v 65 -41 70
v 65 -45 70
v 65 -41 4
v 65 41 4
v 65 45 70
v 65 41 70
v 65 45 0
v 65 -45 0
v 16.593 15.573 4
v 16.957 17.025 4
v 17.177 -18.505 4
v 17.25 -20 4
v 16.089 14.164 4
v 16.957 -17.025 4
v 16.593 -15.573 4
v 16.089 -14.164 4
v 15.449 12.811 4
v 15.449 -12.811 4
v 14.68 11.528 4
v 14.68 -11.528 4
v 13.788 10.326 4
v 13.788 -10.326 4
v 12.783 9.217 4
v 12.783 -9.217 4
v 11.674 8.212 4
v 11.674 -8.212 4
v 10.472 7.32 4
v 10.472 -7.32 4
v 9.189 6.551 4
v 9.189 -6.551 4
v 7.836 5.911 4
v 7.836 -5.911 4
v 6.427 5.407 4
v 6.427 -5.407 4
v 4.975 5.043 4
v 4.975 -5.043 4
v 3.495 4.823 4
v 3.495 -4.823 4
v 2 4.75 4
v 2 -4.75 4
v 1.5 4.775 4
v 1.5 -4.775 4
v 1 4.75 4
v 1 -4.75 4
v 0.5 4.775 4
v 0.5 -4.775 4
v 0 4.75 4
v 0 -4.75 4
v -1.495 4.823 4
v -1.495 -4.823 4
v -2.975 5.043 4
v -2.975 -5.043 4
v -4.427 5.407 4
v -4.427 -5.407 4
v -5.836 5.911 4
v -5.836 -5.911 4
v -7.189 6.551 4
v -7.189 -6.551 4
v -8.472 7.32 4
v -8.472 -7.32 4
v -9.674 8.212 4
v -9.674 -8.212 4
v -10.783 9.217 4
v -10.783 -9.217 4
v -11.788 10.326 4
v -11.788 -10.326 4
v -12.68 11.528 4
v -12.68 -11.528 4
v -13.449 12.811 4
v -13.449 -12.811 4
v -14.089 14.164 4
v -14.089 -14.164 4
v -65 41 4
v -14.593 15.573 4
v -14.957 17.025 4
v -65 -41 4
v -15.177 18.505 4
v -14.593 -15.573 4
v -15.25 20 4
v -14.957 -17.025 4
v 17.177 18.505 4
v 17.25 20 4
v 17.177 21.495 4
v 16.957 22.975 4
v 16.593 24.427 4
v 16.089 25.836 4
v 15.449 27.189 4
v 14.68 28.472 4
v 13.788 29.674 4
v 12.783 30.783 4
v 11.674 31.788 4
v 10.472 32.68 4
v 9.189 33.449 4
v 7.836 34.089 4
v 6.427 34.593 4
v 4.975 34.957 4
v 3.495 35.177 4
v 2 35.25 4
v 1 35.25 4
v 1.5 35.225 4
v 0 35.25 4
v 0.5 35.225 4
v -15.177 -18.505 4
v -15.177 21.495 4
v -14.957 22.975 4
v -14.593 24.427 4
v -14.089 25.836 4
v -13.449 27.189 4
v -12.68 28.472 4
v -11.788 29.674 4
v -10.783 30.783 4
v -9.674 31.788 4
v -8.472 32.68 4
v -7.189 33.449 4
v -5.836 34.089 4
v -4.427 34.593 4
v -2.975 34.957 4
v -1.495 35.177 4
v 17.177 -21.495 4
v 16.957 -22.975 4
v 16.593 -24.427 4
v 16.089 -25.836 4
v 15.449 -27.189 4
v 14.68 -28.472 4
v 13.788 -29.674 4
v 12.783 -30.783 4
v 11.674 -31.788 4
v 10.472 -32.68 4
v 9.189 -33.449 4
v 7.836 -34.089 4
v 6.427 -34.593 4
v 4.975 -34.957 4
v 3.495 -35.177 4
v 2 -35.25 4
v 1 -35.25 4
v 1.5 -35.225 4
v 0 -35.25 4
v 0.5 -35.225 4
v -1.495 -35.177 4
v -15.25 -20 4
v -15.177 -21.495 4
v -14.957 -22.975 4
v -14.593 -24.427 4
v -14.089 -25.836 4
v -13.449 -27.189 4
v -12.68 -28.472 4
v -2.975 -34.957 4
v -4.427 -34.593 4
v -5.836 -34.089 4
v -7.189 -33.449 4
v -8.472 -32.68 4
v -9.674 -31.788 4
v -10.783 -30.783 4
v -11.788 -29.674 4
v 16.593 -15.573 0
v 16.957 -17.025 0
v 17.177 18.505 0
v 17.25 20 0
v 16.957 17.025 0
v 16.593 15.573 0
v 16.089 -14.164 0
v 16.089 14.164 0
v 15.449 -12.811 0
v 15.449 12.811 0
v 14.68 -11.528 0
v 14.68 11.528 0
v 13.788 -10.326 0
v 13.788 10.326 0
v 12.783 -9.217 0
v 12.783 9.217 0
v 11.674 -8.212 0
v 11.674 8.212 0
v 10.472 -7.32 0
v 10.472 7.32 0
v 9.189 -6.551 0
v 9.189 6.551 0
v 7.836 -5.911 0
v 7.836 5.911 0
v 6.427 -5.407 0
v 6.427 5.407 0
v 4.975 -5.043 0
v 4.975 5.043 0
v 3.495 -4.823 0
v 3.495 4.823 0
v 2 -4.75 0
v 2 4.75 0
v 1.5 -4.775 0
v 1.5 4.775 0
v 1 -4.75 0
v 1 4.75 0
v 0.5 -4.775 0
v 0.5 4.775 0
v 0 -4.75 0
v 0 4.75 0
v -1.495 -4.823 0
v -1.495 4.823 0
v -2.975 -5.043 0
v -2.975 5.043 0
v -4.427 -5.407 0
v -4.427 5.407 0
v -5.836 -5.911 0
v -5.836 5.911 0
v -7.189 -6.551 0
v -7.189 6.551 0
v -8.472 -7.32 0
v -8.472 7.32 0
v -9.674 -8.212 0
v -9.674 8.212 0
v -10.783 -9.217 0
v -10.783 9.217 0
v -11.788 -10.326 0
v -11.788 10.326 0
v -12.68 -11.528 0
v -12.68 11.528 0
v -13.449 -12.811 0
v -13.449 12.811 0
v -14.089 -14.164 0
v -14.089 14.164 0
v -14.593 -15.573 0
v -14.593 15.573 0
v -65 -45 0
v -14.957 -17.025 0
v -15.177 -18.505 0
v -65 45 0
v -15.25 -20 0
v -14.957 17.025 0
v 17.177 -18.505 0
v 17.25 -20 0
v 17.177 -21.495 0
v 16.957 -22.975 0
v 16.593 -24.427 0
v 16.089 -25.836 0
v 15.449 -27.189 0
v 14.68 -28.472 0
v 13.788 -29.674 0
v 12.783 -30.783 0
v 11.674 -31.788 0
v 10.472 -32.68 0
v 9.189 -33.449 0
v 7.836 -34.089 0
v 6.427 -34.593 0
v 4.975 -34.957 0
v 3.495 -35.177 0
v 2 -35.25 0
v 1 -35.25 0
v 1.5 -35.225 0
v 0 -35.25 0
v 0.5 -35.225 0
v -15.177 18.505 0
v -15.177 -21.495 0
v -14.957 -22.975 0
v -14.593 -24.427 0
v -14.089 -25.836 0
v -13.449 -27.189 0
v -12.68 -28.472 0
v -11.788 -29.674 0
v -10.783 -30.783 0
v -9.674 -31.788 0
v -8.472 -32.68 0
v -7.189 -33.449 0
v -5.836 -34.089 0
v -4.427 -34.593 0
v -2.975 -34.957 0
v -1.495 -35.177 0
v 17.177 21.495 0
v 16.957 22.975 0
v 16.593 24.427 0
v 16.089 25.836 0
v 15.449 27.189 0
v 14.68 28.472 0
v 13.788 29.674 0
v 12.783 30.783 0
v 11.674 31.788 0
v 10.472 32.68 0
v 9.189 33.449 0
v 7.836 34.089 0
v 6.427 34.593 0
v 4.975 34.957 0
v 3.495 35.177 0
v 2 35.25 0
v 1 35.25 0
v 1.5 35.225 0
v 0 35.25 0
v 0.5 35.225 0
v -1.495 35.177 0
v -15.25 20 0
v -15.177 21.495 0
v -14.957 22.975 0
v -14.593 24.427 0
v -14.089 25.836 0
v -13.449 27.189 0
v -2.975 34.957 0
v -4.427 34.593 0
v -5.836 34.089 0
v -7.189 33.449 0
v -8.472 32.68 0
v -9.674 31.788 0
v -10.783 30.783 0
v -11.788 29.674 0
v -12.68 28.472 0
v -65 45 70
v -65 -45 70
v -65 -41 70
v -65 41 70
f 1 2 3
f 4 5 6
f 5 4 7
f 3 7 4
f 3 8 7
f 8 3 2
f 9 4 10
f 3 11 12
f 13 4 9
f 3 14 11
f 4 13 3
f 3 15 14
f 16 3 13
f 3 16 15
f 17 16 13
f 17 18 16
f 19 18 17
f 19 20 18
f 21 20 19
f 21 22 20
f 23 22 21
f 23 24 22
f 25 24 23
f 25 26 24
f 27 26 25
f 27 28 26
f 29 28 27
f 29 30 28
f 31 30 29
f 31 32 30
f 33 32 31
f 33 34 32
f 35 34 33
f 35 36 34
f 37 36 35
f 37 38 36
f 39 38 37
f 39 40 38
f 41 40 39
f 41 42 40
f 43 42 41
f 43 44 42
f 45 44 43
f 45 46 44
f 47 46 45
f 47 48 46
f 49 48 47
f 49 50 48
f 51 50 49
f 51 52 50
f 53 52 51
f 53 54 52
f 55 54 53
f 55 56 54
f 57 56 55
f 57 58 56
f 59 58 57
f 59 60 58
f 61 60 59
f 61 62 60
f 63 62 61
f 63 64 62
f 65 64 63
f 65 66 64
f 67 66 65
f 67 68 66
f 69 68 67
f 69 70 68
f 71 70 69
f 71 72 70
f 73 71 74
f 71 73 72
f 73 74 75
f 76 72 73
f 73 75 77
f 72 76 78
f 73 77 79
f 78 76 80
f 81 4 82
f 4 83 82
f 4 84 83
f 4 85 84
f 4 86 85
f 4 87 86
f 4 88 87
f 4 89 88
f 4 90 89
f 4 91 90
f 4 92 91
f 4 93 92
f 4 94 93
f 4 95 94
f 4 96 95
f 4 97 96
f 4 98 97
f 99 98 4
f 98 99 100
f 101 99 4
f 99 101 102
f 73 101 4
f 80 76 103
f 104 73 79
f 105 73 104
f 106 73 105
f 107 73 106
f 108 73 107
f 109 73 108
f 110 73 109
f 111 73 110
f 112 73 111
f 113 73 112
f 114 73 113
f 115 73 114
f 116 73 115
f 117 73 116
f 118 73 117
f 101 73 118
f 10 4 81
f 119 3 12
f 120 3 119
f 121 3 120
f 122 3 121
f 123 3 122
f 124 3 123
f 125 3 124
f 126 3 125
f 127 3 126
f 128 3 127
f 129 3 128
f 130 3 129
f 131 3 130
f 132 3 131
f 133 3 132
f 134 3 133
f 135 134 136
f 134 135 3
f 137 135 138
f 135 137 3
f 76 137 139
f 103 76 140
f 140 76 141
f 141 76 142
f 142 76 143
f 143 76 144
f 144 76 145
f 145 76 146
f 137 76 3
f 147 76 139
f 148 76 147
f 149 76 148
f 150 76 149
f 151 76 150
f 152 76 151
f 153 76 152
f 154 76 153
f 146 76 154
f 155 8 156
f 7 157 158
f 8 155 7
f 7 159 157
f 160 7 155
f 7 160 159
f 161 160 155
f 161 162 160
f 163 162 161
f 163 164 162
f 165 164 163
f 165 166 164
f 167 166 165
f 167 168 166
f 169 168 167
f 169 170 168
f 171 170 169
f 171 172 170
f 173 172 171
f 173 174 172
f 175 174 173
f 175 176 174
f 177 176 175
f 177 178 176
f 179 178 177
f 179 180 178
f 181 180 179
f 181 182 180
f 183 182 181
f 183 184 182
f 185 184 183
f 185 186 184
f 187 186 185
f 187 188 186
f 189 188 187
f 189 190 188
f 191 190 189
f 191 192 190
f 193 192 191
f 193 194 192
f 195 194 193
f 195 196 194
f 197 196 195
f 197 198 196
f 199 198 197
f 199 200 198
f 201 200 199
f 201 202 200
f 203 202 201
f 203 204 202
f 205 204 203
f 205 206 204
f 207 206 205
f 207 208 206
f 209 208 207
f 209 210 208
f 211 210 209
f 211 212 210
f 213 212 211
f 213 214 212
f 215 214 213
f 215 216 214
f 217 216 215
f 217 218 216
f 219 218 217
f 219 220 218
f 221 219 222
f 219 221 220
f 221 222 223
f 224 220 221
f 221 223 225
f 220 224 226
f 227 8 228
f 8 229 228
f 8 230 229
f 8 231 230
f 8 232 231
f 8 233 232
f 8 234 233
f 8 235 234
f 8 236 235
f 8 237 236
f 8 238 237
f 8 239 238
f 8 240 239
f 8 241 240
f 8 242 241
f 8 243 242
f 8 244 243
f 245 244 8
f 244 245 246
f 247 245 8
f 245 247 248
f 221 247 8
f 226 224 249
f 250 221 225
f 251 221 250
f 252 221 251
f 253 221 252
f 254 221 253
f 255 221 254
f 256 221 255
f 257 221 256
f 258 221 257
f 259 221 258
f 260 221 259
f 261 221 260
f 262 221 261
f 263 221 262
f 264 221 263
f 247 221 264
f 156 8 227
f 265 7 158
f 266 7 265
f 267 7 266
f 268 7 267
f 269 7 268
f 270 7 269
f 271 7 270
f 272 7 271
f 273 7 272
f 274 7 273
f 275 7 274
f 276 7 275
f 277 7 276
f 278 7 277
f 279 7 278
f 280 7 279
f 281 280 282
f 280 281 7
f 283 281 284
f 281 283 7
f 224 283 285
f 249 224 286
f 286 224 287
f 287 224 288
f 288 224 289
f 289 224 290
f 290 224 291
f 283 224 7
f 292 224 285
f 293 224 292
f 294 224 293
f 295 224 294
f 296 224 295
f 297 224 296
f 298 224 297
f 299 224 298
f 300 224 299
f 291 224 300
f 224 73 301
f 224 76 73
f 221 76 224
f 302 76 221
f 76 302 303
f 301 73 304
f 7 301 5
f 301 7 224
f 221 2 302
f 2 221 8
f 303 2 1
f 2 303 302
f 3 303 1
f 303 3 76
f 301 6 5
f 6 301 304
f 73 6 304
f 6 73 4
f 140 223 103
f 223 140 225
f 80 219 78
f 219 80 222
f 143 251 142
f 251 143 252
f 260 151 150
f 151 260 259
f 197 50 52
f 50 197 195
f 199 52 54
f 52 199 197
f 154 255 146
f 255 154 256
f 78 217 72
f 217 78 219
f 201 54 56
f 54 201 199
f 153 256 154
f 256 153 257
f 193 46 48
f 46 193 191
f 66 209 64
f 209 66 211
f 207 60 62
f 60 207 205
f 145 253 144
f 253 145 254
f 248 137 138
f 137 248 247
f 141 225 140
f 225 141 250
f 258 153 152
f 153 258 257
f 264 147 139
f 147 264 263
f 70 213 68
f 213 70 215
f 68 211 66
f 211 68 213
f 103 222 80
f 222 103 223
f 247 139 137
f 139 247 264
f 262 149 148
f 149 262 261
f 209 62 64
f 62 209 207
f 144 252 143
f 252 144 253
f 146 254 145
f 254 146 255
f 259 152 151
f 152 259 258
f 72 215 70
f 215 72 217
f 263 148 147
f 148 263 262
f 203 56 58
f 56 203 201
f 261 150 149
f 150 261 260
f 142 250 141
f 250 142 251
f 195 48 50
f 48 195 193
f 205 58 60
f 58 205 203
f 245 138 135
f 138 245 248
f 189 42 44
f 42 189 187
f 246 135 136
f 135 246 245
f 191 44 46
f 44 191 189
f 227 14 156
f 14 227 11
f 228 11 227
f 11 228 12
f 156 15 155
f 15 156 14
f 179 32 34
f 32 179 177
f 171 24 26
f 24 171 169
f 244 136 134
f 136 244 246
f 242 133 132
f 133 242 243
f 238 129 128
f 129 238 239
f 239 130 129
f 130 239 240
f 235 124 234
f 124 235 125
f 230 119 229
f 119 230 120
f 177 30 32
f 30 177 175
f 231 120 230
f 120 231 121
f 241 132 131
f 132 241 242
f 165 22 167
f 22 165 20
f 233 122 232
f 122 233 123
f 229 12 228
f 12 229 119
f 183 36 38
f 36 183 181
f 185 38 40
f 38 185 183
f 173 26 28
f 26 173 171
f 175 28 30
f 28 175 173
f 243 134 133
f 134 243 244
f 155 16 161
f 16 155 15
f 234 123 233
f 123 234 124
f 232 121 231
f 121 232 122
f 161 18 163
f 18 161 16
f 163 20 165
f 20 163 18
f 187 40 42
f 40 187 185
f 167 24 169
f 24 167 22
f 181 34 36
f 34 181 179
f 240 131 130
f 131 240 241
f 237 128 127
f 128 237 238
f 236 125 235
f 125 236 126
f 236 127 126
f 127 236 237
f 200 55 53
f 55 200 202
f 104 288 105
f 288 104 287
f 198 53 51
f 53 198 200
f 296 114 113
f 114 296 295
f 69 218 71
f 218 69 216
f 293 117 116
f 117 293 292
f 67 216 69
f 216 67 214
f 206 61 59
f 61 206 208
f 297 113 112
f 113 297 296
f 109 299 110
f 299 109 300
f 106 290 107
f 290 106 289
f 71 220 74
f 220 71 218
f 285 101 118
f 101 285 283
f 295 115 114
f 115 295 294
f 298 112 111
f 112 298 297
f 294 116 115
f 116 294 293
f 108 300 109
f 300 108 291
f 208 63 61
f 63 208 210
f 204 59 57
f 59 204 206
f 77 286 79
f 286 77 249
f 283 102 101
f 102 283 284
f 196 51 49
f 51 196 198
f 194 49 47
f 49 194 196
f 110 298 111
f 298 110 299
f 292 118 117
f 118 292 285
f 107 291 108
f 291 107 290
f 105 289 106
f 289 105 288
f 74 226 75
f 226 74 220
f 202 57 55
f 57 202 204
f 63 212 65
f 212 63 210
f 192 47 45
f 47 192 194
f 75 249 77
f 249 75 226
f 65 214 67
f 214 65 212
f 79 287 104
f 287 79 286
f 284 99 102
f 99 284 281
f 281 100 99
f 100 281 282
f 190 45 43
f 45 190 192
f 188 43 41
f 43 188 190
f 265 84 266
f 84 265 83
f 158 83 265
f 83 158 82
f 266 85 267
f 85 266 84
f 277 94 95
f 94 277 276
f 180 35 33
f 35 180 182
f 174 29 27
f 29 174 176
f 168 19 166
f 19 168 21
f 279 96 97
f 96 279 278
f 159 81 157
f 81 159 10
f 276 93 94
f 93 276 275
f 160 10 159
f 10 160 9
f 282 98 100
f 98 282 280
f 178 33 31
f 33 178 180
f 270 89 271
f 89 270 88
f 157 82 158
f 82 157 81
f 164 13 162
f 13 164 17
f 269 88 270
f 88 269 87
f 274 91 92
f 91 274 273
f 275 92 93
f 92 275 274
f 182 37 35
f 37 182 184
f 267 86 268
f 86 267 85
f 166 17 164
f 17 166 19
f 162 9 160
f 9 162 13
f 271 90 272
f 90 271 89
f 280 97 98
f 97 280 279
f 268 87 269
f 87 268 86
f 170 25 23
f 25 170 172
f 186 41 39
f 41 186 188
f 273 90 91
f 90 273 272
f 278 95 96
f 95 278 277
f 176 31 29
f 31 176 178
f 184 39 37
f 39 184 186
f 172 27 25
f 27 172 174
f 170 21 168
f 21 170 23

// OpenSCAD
// Rack for six 50 mL conical tubes.
// Print orientation: Flat plate on bed (z=0), walls rising to z=70.
// After printing, flip over so walls are on the bed and tubes hang down.

// Plate dimensions
L     = 130; // Length (X)
W     = 90;  // Width (Y)
t     = 4;   // Plate thickness (Z)

// Tube hole dimensions
n_rows = 2; // Rows along Y
n_cols = 3; // Columns along X
hole_d = 30.5; // Hole diameter
pitch_x = 40; // Centre-to-centre spacing X
pitch_y = 40; // Centre-to-centre spacing Y

// Wall dimensions
wall_h = 70; // Wall height from plate top
wall_t = 4;  // Wall thickness (Y)

// Geometry parameters
$fn = 64;

// Calculate positions for holes centred on the plate
// Rows along Y: indices 0, 1. Centres at -pitch_y/2, +pitch_y/2
// Cols along X: indices 0, 1, 2. Centres at -pitch_x, 0, +pitch_x
hole_positions = [
    [0, -pitch_y / 2],
    [1, -pitch_y / 2],
    [2, -pitch_y / 2],
    [0, pitch_y / 2],
    [1, pitch_y / 2],
    [2, pitch_y / 2]
];

// Main body: Plate + Walls
difference() {
    union() {
        // 1. The flat plate
        translate([-L / 2, -W / 2, 0]) 
            cube([L, W, t]);

        // 2. Two solid walls along the long edges (X axis)
        // Left wall (at Y = -W/2)
        translate([-L / 2, -W / 2, 0]) 
            cube([L, wall_t, wall_h]);
        
        // Right wall (at Y = +W/2)
        translate([-L / 2, W / 2 - wall_t, 0]) 
            cube([L, wall_t, wall_h]);
    }

    // Cut out the six tube holes
    for (p = hole_positions) {
        translate(p) 
            cylinder(h = t + 1, d = hole_d); // Extend slightly past plate thickness
    }
}
